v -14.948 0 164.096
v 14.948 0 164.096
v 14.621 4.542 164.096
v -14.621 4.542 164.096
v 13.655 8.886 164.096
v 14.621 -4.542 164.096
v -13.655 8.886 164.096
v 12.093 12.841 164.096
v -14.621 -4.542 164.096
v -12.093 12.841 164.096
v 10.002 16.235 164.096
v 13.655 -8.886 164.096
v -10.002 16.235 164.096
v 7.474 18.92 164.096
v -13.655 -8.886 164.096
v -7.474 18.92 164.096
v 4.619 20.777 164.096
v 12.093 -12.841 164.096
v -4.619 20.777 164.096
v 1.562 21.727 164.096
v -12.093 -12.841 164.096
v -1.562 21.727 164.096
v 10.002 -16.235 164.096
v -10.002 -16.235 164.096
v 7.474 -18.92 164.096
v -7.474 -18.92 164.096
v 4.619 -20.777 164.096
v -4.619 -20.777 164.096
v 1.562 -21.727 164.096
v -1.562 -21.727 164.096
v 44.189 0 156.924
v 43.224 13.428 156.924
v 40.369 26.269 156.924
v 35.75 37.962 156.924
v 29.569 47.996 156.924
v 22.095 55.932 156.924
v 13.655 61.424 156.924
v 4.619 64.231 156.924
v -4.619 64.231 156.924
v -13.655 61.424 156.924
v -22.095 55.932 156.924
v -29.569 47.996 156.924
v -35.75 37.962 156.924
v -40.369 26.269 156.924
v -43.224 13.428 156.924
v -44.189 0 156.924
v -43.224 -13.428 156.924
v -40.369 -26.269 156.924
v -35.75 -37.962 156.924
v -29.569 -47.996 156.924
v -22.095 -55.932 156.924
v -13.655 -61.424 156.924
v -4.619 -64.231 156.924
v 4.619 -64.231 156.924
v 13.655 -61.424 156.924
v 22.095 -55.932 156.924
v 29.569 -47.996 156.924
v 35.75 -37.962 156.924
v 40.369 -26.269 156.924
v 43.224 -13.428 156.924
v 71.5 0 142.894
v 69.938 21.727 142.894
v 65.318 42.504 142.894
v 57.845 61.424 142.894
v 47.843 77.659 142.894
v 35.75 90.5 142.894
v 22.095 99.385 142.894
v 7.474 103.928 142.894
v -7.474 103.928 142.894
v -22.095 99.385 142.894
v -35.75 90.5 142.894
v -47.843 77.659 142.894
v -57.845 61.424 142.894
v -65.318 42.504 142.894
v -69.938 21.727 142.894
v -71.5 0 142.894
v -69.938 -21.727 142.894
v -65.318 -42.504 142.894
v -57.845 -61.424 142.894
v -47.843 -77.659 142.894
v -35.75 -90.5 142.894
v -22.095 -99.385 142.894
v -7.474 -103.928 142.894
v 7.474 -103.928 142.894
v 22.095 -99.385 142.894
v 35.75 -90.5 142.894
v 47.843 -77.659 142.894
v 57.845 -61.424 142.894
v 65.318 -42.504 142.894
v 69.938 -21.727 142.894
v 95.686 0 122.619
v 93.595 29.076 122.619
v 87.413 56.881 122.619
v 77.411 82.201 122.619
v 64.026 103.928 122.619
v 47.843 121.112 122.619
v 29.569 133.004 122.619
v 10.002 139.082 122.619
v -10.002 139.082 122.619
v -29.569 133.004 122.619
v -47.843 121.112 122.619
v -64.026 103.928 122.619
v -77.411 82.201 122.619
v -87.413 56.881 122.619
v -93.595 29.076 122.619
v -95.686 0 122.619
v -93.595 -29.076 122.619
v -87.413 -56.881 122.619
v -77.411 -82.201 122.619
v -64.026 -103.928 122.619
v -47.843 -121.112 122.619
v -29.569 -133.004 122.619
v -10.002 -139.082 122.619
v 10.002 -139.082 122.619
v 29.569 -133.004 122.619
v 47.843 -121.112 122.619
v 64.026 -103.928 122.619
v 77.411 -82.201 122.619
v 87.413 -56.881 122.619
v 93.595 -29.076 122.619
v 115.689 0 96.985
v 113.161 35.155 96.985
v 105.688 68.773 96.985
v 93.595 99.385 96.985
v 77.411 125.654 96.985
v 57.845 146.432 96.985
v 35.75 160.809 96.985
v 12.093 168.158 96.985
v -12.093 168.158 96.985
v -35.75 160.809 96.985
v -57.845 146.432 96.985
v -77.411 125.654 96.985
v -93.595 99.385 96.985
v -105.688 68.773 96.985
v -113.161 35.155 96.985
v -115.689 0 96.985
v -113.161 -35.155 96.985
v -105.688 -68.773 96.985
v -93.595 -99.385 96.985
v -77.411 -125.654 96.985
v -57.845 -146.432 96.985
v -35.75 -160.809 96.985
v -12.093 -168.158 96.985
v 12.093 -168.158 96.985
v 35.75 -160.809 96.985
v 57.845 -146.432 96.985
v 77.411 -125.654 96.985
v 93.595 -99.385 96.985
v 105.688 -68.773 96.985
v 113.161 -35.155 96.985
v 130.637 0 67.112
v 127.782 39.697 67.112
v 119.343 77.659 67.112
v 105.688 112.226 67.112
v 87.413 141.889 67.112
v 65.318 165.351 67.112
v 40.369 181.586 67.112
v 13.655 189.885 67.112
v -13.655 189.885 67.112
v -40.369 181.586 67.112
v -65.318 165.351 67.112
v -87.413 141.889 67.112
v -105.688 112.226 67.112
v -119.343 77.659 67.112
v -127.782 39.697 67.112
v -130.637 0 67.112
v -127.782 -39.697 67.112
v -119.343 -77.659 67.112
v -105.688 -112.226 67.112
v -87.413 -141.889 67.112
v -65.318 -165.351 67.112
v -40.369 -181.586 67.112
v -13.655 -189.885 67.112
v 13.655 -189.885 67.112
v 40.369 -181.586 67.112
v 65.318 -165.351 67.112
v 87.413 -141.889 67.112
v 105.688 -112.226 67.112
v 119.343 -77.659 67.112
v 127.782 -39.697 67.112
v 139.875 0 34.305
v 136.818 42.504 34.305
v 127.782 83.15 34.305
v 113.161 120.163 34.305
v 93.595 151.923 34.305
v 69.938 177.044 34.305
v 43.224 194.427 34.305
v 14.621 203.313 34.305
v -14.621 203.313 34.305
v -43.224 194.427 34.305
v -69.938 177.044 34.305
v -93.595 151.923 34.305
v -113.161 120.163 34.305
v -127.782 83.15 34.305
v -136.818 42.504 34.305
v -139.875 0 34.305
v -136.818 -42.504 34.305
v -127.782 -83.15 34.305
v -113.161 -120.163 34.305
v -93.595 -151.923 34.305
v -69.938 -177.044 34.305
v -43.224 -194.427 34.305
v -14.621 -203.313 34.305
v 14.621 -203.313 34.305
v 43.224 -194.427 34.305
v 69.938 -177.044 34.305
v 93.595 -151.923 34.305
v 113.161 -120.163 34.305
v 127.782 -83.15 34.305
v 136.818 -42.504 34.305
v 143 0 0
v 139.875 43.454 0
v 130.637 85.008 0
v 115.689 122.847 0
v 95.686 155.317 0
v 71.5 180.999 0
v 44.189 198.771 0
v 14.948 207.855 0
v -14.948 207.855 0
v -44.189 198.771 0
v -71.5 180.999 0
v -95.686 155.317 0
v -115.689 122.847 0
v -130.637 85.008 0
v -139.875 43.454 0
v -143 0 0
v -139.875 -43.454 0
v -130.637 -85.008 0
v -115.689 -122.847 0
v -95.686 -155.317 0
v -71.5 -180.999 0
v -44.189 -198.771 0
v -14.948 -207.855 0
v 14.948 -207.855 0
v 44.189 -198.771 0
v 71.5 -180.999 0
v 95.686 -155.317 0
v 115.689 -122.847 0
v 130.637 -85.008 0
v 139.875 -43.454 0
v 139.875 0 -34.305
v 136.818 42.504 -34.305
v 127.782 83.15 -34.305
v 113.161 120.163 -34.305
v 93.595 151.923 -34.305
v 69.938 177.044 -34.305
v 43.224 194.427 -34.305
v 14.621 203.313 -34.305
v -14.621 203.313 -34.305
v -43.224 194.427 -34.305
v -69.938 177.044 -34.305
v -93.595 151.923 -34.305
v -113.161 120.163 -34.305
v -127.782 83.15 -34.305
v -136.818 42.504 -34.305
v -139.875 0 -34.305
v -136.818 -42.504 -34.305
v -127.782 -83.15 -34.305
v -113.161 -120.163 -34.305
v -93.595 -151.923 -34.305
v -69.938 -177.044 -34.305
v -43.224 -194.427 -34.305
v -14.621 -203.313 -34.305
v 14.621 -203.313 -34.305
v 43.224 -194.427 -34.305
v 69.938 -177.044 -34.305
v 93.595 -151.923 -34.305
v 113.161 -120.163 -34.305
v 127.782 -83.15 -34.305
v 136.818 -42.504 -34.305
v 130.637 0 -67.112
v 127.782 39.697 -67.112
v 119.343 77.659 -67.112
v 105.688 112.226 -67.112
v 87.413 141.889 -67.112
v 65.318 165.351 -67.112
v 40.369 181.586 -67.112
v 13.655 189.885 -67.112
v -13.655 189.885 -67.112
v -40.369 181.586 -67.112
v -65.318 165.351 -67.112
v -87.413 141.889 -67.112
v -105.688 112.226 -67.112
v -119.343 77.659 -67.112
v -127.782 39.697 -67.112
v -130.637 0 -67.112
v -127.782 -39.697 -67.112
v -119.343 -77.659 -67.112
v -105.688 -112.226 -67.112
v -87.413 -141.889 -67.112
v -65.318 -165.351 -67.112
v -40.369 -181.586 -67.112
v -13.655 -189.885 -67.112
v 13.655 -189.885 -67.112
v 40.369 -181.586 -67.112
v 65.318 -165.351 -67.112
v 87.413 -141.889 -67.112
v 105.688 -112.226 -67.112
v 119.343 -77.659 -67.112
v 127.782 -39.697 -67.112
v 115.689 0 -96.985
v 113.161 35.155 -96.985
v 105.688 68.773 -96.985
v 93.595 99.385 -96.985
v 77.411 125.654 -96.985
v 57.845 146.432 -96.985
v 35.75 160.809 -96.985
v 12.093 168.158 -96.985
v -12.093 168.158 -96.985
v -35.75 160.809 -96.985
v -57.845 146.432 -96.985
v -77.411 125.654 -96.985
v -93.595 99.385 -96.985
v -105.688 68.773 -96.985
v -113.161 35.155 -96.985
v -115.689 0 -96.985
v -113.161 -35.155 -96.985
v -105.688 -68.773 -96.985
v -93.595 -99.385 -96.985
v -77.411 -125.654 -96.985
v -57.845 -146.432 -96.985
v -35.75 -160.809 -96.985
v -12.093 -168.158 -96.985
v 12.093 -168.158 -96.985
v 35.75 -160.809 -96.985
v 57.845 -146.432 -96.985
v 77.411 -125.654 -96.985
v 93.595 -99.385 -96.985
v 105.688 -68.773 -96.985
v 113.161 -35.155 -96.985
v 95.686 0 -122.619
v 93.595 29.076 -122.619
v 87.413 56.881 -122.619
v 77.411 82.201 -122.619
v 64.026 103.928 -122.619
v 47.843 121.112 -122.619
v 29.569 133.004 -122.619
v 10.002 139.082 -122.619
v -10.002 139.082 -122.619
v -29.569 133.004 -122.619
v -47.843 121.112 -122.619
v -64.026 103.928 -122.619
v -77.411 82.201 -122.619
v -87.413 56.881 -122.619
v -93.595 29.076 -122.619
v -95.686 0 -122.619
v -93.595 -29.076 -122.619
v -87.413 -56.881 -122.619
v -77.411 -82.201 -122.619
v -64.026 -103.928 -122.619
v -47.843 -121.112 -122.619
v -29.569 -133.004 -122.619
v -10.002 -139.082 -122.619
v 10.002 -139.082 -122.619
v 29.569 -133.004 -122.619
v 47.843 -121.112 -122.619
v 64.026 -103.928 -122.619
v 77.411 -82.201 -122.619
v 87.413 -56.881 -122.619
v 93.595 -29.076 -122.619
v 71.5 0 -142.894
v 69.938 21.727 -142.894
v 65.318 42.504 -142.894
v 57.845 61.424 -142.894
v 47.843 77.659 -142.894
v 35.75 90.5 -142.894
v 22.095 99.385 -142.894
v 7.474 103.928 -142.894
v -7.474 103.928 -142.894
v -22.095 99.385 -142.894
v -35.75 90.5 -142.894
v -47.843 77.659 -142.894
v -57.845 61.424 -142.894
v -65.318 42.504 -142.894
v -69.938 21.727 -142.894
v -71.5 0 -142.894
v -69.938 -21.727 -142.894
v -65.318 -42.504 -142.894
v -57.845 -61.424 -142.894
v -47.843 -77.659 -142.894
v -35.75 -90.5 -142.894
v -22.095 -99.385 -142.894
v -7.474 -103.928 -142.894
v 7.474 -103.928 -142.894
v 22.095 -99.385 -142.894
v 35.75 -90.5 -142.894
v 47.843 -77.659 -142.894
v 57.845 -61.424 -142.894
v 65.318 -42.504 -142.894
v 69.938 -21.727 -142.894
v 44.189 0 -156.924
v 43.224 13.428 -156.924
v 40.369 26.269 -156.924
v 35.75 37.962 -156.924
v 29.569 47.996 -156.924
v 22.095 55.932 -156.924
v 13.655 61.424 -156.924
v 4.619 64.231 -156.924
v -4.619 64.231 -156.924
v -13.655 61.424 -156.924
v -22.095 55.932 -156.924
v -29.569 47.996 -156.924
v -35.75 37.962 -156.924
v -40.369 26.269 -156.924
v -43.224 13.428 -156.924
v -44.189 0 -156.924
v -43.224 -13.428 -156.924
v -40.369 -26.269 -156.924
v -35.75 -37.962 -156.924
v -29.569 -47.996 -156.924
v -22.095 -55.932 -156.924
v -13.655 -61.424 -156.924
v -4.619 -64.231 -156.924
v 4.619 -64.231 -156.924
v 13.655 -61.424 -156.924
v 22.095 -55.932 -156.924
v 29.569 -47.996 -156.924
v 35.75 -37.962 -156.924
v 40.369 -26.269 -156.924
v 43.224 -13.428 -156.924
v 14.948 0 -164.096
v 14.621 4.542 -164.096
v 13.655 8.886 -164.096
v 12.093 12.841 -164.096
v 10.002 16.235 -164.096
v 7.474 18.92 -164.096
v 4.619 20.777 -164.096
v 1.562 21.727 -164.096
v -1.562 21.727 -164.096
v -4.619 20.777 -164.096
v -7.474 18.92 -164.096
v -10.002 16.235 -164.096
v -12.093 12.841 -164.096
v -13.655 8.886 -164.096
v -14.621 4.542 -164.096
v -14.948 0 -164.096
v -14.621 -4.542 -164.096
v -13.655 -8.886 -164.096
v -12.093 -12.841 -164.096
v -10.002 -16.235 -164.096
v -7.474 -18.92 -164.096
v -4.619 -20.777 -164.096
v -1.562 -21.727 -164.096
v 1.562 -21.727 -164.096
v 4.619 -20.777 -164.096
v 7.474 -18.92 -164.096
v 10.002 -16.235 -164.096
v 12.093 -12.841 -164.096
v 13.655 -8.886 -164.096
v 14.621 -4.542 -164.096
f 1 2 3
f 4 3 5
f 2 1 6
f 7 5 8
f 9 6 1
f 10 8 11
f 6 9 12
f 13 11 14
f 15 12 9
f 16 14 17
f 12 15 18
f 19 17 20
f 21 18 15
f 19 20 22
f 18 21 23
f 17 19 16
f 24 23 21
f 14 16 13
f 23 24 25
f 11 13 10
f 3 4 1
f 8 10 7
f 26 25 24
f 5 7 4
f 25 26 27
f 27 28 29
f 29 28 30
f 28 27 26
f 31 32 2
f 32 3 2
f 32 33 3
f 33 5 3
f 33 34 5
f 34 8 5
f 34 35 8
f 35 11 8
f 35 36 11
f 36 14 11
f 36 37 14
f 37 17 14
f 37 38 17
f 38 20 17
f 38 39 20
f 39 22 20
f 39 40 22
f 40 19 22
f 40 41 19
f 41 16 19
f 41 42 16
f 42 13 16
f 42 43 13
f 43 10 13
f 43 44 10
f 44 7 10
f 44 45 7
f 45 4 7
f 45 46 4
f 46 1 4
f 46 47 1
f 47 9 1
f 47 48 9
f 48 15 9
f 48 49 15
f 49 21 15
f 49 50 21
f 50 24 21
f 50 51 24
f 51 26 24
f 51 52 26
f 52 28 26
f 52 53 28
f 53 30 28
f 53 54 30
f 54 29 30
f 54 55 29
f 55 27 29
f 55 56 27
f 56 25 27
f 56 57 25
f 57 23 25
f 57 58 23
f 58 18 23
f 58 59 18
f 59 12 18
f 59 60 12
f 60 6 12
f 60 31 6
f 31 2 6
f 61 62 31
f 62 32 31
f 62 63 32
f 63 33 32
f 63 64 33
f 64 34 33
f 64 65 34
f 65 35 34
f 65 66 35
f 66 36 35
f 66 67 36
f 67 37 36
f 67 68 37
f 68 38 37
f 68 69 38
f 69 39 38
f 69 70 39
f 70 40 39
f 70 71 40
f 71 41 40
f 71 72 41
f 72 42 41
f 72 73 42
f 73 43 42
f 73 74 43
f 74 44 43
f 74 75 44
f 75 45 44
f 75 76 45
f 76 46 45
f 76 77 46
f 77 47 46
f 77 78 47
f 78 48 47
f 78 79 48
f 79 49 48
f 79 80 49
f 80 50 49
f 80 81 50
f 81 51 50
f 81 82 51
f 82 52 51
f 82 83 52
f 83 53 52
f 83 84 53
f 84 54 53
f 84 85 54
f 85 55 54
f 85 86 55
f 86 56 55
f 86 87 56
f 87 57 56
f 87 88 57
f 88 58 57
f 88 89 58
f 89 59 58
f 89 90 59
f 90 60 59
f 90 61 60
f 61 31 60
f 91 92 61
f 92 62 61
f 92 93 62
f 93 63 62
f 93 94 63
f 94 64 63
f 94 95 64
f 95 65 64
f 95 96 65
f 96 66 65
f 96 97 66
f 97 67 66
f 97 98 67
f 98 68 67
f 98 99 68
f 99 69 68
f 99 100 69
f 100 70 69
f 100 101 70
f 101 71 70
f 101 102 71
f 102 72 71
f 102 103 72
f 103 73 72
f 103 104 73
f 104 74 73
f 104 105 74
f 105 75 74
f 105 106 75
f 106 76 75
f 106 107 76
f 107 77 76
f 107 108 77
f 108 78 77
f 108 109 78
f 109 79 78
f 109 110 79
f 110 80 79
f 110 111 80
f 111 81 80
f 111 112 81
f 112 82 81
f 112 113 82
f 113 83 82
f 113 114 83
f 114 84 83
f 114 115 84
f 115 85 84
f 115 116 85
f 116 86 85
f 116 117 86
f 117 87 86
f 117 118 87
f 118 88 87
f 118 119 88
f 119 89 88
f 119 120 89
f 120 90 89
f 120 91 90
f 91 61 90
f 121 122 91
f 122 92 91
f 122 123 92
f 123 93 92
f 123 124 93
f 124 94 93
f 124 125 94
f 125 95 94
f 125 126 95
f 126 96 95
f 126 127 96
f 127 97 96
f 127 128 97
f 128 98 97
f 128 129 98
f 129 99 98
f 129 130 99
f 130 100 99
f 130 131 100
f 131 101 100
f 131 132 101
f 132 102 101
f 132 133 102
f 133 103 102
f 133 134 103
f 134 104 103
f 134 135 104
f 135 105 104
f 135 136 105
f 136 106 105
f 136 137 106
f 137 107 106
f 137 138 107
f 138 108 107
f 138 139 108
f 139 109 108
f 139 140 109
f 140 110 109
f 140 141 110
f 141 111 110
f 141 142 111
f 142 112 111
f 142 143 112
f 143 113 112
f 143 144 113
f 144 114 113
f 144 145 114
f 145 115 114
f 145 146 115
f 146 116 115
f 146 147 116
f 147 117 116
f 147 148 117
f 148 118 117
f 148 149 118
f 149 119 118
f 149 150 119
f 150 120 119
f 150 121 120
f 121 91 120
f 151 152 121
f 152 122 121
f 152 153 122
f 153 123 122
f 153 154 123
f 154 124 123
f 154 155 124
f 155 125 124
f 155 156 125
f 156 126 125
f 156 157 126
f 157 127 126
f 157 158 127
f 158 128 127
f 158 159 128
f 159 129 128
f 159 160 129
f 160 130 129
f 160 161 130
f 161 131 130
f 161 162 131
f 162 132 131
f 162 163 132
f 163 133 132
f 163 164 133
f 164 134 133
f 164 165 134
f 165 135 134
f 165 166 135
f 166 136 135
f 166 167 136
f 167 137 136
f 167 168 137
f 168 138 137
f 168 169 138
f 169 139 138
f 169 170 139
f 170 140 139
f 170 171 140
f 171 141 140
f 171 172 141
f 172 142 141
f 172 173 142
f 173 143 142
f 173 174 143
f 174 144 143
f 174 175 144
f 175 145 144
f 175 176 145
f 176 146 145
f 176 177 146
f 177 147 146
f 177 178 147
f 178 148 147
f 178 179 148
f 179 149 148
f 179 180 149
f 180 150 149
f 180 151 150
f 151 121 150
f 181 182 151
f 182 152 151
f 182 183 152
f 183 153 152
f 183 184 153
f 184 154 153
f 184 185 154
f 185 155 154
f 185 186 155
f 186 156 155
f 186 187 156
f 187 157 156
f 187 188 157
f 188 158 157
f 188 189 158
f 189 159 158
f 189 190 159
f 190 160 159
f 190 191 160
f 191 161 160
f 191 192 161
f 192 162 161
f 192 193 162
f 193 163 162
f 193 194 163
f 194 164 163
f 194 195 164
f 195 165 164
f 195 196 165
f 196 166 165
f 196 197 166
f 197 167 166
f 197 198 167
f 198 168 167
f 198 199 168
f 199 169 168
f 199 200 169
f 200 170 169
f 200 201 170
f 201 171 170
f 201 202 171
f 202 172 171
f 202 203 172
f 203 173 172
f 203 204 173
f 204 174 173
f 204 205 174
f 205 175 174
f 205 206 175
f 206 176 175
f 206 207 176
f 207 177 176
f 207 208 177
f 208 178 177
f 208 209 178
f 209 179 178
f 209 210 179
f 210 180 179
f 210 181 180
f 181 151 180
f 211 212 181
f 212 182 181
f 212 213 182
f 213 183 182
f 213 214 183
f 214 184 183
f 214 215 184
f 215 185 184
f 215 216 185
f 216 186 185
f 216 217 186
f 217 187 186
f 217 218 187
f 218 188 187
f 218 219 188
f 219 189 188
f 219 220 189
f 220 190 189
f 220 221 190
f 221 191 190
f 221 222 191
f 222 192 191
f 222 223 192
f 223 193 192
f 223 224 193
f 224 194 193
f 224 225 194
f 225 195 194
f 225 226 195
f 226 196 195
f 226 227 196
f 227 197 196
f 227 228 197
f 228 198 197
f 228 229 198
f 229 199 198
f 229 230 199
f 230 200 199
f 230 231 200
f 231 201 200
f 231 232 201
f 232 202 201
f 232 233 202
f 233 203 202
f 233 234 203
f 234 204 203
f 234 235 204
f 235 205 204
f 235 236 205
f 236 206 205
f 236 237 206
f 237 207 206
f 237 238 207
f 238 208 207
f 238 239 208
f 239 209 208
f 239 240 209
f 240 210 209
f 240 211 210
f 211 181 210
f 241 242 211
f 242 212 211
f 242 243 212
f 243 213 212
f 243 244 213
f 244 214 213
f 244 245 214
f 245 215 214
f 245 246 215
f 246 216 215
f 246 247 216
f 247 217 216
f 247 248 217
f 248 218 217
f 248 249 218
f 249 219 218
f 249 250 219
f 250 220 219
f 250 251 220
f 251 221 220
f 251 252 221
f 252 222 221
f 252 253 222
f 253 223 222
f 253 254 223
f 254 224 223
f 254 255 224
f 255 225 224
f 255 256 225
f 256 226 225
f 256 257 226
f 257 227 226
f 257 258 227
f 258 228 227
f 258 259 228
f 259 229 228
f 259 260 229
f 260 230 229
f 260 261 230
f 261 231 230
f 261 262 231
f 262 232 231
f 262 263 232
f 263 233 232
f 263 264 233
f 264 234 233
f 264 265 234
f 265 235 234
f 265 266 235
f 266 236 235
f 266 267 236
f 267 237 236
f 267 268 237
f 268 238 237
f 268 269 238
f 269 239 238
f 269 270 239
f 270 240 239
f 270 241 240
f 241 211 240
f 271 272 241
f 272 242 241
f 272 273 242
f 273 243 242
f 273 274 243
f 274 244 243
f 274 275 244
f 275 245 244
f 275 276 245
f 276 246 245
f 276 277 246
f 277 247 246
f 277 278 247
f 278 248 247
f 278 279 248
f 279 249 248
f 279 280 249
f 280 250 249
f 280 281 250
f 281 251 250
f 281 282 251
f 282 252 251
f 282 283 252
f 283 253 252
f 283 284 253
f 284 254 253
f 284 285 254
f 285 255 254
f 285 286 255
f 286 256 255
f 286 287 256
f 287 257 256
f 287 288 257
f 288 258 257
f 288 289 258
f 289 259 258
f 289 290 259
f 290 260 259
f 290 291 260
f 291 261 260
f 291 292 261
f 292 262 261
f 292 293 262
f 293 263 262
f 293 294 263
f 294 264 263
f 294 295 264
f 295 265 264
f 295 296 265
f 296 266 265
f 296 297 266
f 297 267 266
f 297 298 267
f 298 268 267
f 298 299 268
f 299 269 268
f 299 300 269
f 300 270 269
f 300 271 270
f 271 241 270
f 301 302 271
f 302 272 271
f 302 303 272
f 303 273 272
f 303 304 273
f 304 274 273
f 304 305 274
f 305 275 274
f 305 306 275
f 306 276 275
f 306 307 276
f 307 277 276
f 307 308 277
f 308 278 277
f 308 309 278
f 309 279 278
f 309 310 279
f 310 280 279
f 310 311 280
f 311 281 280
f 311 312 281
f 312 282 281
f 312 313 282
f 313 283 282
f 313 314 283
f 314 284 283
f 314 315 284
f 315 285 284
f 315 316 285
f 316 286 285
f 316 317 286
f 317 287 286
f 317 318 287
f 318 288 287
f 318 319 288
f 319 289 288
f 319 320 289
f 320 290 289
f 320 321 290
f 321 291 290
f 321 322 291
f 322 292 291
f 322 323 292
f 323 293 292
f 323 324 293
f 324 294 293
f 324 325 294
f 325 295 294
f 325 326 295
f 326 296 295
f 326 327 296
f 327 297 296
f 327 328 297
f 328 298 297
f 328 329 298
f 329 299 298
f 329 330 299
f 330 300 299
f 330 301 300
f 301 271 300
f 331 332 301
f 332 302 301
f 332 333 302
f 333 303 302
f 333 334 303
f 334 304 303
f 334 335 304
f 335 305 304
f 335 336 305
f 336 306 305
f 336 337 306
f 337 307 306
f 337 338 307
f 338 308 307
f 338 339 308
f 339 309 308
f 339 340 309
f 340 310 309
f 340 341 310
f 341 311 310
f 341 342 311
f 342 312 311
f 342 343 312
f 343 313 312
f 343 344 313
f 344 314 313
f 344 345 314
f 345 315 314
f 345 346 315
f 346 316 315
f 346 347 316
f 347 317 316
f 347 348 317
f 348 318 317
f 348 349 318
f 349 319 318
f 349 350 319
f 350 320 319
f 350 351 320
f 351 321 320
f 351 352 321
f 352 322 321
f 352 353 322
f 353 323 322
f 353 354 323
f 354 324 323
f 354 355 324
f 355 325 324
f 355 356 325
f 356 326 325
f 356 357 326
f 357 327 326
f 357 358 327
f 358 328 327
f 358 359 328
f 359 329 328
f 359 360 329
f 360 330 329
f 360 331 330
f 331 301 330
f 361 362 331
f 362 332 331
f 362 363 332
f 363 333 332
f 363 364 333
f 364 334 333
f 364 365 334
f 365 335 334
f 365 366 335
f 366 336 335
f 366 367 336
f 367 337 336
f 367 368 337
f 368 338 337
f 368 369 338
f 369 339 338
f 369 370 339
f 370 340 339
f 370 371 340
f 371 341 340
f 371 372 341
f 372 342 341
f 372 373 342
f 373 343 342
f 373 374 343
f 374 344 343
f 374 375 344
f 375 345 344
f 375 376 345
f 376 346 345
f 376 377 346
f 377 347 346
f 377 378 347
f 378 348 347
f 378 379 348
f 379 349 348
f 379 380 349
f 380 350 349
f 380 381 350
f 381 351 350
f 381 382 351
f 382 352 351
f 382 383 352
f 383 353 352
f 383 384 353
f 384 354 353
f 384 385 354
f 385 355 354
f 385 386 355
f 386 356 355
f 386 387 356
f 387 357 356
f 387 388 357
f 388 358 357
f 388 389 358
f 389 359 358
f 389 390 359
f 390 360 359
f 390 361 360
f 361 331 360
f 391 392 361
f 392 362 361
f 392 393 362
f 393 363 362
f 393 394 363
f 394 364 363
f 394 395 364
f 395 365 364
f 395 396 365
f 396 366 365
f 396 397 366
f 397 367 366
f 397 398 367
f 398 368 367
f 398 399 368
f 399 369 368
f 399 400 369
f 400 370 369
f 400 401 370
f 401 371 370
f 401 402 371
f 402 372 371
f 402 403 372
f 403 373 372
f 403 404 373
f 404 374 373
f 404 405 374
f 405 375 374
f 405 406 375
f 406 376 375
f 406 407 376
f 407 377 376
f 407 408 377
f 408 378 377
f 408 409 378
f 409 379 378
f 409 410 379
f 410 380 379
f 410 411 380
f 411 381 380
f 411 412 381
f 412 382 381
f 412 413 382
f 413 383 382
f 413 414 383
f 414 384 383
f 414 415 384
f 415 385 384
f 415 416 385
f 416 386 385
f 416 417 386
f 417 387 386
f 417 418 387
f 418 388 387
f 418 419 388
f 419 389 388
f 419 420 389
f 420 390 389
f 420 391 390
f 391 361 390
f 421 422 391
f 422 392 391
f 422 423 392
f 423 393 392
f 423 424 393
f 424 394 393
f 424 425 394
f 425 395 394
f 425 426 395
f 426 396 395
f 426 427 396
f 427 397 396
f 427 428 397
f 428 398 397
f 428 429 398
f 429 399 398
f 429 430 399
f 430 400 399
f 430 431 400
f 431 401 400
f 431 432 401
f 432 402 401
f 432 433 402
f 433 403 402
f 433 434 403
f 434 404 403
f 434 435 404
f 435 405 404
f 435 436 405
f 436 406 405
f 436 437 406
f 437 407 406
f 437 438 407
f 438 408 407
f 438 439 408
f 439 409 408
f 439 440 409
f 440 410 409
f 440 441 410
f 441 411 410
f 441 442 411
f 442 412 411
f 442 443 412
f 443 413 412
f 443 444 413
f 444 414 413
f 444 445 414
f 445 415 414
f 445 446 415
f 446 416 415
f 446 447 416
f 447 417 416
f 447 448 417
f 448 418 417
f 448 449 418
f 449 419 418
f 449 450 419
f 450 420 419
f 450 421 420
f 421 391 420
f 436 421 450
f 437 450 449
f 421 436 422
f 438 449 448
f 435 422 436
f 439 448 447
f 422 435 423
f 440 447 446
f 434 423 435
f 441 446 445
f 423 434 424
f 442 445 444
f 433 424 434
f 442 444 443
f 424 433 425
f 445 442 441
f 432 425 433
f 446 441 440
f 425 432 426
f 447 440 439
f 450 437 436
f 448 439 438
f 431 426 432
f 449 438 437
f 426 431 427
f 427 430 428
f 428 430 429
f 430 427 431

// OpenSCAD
// Generated by SolidPython 1.0.1 on 2020-07-29 00:46:51


scale(v = [13, 19, 15]) {
	sphere(r = 11);
}
/***********************************************
*********      SolidPython code:      **********
************************************************
 
# import packages: SolidPython
from solid import *
from solid.utils import *
from itertools import chain, combinations, permutations


class Resize:

    def __init__(self, scad_file):
        self.scad_file = scad_file
        #self.scad_file = import_scad(scad_file)
        # cone/cylinder param:
        self.r1 = 0
        self.r2 = 0
        self.h = 0
        # rectangular prism param:
        self.w = 0
        self.l = 0
        # ellipse param:
        self.r = 0

    # import OpenScad code (file name corresponds to shape)


    # classify shape + parameters
    def assign(self, param1, param2, param3):
        if self.scad_file == 'cone.scad':
            self.r1 = param1
            self.r2 = param2
            self.h = param3
        elif self.scad_file == 'cylinder.scad':
            self.r1 = param1
            self.r2 = param2
            self.h = param3
        elif self.scad_file == 'rectangularPrism.scad':
            self.h = param1
            self.l = param2
            self.w = param3
        else:
            self.r = param1
            self.h = param2

    # resize parameters
    def iterate(self):
        x = range(3, 20, 2)
        i = 1
        if self.scad_file == 'cone.scad':
            tempList = list(permutations(x, 2))
            for temp in tempList:
                param1 = temp[0]
                param2 = temp[1]
                filepath = 'produced_scad_files/' + 'cone' + str(param1) + '_' + str(param2) + '_' + '.scad'
                scad_render_to_file(cylinder(h=param1, r1=param2, r2=0), filepath)

        elif self.scad_file == 'cylinder.scad':
            tempList = list(permutations(x, 3))
            for temp in tempList:
                param1 = temp[0]
                param2 = temp[1]
                filepath = 'produced_scad_files/' + 'cylinder' + str(param1) + '_' + str(param2) + '_' + '.scad'
                scad_render_to_file(cylinder(h=param1, r1=param2, r2=param2), filepath)

        elif self.scad_file == 'rectangularPrism.scad':
            tempList = list(permutations(x, 3))
            for temp in tempList:
                param1 = temp[0]
                param2 = temp[1]
                param3 = temp[2]
                filepath = 'produced_scad_files/' + 'rectangularPrism' + str(param1) + '_' + str(param2) + '_' + str(
                    param3) + '.scad'
                scad_render_to_file(cube(size=(param1, param2, param3)), filepath)

        elif self.scad_file == 'ellipse.scad':
            tempList = list(permutations(x, 4))
            for temp in tempList:
                param1 = temp[0]
                param2 = temp[1]
                param3 = temp[2]
                param4 = temp[3]
                filepath = 'produced_scad_files/' + 'ellipse' + str(param1) + '_' + str(param2) + '_' + str(param3) + '_' + str(param4) + '.scad'
                scad_render_to_file(scale([param1, param2, param3])(sphere(r=param4)), filepath)

    def render_to_scadfile(self):
        scad_render_to_file(scad, 'example.scad') 
 
************************************************/
